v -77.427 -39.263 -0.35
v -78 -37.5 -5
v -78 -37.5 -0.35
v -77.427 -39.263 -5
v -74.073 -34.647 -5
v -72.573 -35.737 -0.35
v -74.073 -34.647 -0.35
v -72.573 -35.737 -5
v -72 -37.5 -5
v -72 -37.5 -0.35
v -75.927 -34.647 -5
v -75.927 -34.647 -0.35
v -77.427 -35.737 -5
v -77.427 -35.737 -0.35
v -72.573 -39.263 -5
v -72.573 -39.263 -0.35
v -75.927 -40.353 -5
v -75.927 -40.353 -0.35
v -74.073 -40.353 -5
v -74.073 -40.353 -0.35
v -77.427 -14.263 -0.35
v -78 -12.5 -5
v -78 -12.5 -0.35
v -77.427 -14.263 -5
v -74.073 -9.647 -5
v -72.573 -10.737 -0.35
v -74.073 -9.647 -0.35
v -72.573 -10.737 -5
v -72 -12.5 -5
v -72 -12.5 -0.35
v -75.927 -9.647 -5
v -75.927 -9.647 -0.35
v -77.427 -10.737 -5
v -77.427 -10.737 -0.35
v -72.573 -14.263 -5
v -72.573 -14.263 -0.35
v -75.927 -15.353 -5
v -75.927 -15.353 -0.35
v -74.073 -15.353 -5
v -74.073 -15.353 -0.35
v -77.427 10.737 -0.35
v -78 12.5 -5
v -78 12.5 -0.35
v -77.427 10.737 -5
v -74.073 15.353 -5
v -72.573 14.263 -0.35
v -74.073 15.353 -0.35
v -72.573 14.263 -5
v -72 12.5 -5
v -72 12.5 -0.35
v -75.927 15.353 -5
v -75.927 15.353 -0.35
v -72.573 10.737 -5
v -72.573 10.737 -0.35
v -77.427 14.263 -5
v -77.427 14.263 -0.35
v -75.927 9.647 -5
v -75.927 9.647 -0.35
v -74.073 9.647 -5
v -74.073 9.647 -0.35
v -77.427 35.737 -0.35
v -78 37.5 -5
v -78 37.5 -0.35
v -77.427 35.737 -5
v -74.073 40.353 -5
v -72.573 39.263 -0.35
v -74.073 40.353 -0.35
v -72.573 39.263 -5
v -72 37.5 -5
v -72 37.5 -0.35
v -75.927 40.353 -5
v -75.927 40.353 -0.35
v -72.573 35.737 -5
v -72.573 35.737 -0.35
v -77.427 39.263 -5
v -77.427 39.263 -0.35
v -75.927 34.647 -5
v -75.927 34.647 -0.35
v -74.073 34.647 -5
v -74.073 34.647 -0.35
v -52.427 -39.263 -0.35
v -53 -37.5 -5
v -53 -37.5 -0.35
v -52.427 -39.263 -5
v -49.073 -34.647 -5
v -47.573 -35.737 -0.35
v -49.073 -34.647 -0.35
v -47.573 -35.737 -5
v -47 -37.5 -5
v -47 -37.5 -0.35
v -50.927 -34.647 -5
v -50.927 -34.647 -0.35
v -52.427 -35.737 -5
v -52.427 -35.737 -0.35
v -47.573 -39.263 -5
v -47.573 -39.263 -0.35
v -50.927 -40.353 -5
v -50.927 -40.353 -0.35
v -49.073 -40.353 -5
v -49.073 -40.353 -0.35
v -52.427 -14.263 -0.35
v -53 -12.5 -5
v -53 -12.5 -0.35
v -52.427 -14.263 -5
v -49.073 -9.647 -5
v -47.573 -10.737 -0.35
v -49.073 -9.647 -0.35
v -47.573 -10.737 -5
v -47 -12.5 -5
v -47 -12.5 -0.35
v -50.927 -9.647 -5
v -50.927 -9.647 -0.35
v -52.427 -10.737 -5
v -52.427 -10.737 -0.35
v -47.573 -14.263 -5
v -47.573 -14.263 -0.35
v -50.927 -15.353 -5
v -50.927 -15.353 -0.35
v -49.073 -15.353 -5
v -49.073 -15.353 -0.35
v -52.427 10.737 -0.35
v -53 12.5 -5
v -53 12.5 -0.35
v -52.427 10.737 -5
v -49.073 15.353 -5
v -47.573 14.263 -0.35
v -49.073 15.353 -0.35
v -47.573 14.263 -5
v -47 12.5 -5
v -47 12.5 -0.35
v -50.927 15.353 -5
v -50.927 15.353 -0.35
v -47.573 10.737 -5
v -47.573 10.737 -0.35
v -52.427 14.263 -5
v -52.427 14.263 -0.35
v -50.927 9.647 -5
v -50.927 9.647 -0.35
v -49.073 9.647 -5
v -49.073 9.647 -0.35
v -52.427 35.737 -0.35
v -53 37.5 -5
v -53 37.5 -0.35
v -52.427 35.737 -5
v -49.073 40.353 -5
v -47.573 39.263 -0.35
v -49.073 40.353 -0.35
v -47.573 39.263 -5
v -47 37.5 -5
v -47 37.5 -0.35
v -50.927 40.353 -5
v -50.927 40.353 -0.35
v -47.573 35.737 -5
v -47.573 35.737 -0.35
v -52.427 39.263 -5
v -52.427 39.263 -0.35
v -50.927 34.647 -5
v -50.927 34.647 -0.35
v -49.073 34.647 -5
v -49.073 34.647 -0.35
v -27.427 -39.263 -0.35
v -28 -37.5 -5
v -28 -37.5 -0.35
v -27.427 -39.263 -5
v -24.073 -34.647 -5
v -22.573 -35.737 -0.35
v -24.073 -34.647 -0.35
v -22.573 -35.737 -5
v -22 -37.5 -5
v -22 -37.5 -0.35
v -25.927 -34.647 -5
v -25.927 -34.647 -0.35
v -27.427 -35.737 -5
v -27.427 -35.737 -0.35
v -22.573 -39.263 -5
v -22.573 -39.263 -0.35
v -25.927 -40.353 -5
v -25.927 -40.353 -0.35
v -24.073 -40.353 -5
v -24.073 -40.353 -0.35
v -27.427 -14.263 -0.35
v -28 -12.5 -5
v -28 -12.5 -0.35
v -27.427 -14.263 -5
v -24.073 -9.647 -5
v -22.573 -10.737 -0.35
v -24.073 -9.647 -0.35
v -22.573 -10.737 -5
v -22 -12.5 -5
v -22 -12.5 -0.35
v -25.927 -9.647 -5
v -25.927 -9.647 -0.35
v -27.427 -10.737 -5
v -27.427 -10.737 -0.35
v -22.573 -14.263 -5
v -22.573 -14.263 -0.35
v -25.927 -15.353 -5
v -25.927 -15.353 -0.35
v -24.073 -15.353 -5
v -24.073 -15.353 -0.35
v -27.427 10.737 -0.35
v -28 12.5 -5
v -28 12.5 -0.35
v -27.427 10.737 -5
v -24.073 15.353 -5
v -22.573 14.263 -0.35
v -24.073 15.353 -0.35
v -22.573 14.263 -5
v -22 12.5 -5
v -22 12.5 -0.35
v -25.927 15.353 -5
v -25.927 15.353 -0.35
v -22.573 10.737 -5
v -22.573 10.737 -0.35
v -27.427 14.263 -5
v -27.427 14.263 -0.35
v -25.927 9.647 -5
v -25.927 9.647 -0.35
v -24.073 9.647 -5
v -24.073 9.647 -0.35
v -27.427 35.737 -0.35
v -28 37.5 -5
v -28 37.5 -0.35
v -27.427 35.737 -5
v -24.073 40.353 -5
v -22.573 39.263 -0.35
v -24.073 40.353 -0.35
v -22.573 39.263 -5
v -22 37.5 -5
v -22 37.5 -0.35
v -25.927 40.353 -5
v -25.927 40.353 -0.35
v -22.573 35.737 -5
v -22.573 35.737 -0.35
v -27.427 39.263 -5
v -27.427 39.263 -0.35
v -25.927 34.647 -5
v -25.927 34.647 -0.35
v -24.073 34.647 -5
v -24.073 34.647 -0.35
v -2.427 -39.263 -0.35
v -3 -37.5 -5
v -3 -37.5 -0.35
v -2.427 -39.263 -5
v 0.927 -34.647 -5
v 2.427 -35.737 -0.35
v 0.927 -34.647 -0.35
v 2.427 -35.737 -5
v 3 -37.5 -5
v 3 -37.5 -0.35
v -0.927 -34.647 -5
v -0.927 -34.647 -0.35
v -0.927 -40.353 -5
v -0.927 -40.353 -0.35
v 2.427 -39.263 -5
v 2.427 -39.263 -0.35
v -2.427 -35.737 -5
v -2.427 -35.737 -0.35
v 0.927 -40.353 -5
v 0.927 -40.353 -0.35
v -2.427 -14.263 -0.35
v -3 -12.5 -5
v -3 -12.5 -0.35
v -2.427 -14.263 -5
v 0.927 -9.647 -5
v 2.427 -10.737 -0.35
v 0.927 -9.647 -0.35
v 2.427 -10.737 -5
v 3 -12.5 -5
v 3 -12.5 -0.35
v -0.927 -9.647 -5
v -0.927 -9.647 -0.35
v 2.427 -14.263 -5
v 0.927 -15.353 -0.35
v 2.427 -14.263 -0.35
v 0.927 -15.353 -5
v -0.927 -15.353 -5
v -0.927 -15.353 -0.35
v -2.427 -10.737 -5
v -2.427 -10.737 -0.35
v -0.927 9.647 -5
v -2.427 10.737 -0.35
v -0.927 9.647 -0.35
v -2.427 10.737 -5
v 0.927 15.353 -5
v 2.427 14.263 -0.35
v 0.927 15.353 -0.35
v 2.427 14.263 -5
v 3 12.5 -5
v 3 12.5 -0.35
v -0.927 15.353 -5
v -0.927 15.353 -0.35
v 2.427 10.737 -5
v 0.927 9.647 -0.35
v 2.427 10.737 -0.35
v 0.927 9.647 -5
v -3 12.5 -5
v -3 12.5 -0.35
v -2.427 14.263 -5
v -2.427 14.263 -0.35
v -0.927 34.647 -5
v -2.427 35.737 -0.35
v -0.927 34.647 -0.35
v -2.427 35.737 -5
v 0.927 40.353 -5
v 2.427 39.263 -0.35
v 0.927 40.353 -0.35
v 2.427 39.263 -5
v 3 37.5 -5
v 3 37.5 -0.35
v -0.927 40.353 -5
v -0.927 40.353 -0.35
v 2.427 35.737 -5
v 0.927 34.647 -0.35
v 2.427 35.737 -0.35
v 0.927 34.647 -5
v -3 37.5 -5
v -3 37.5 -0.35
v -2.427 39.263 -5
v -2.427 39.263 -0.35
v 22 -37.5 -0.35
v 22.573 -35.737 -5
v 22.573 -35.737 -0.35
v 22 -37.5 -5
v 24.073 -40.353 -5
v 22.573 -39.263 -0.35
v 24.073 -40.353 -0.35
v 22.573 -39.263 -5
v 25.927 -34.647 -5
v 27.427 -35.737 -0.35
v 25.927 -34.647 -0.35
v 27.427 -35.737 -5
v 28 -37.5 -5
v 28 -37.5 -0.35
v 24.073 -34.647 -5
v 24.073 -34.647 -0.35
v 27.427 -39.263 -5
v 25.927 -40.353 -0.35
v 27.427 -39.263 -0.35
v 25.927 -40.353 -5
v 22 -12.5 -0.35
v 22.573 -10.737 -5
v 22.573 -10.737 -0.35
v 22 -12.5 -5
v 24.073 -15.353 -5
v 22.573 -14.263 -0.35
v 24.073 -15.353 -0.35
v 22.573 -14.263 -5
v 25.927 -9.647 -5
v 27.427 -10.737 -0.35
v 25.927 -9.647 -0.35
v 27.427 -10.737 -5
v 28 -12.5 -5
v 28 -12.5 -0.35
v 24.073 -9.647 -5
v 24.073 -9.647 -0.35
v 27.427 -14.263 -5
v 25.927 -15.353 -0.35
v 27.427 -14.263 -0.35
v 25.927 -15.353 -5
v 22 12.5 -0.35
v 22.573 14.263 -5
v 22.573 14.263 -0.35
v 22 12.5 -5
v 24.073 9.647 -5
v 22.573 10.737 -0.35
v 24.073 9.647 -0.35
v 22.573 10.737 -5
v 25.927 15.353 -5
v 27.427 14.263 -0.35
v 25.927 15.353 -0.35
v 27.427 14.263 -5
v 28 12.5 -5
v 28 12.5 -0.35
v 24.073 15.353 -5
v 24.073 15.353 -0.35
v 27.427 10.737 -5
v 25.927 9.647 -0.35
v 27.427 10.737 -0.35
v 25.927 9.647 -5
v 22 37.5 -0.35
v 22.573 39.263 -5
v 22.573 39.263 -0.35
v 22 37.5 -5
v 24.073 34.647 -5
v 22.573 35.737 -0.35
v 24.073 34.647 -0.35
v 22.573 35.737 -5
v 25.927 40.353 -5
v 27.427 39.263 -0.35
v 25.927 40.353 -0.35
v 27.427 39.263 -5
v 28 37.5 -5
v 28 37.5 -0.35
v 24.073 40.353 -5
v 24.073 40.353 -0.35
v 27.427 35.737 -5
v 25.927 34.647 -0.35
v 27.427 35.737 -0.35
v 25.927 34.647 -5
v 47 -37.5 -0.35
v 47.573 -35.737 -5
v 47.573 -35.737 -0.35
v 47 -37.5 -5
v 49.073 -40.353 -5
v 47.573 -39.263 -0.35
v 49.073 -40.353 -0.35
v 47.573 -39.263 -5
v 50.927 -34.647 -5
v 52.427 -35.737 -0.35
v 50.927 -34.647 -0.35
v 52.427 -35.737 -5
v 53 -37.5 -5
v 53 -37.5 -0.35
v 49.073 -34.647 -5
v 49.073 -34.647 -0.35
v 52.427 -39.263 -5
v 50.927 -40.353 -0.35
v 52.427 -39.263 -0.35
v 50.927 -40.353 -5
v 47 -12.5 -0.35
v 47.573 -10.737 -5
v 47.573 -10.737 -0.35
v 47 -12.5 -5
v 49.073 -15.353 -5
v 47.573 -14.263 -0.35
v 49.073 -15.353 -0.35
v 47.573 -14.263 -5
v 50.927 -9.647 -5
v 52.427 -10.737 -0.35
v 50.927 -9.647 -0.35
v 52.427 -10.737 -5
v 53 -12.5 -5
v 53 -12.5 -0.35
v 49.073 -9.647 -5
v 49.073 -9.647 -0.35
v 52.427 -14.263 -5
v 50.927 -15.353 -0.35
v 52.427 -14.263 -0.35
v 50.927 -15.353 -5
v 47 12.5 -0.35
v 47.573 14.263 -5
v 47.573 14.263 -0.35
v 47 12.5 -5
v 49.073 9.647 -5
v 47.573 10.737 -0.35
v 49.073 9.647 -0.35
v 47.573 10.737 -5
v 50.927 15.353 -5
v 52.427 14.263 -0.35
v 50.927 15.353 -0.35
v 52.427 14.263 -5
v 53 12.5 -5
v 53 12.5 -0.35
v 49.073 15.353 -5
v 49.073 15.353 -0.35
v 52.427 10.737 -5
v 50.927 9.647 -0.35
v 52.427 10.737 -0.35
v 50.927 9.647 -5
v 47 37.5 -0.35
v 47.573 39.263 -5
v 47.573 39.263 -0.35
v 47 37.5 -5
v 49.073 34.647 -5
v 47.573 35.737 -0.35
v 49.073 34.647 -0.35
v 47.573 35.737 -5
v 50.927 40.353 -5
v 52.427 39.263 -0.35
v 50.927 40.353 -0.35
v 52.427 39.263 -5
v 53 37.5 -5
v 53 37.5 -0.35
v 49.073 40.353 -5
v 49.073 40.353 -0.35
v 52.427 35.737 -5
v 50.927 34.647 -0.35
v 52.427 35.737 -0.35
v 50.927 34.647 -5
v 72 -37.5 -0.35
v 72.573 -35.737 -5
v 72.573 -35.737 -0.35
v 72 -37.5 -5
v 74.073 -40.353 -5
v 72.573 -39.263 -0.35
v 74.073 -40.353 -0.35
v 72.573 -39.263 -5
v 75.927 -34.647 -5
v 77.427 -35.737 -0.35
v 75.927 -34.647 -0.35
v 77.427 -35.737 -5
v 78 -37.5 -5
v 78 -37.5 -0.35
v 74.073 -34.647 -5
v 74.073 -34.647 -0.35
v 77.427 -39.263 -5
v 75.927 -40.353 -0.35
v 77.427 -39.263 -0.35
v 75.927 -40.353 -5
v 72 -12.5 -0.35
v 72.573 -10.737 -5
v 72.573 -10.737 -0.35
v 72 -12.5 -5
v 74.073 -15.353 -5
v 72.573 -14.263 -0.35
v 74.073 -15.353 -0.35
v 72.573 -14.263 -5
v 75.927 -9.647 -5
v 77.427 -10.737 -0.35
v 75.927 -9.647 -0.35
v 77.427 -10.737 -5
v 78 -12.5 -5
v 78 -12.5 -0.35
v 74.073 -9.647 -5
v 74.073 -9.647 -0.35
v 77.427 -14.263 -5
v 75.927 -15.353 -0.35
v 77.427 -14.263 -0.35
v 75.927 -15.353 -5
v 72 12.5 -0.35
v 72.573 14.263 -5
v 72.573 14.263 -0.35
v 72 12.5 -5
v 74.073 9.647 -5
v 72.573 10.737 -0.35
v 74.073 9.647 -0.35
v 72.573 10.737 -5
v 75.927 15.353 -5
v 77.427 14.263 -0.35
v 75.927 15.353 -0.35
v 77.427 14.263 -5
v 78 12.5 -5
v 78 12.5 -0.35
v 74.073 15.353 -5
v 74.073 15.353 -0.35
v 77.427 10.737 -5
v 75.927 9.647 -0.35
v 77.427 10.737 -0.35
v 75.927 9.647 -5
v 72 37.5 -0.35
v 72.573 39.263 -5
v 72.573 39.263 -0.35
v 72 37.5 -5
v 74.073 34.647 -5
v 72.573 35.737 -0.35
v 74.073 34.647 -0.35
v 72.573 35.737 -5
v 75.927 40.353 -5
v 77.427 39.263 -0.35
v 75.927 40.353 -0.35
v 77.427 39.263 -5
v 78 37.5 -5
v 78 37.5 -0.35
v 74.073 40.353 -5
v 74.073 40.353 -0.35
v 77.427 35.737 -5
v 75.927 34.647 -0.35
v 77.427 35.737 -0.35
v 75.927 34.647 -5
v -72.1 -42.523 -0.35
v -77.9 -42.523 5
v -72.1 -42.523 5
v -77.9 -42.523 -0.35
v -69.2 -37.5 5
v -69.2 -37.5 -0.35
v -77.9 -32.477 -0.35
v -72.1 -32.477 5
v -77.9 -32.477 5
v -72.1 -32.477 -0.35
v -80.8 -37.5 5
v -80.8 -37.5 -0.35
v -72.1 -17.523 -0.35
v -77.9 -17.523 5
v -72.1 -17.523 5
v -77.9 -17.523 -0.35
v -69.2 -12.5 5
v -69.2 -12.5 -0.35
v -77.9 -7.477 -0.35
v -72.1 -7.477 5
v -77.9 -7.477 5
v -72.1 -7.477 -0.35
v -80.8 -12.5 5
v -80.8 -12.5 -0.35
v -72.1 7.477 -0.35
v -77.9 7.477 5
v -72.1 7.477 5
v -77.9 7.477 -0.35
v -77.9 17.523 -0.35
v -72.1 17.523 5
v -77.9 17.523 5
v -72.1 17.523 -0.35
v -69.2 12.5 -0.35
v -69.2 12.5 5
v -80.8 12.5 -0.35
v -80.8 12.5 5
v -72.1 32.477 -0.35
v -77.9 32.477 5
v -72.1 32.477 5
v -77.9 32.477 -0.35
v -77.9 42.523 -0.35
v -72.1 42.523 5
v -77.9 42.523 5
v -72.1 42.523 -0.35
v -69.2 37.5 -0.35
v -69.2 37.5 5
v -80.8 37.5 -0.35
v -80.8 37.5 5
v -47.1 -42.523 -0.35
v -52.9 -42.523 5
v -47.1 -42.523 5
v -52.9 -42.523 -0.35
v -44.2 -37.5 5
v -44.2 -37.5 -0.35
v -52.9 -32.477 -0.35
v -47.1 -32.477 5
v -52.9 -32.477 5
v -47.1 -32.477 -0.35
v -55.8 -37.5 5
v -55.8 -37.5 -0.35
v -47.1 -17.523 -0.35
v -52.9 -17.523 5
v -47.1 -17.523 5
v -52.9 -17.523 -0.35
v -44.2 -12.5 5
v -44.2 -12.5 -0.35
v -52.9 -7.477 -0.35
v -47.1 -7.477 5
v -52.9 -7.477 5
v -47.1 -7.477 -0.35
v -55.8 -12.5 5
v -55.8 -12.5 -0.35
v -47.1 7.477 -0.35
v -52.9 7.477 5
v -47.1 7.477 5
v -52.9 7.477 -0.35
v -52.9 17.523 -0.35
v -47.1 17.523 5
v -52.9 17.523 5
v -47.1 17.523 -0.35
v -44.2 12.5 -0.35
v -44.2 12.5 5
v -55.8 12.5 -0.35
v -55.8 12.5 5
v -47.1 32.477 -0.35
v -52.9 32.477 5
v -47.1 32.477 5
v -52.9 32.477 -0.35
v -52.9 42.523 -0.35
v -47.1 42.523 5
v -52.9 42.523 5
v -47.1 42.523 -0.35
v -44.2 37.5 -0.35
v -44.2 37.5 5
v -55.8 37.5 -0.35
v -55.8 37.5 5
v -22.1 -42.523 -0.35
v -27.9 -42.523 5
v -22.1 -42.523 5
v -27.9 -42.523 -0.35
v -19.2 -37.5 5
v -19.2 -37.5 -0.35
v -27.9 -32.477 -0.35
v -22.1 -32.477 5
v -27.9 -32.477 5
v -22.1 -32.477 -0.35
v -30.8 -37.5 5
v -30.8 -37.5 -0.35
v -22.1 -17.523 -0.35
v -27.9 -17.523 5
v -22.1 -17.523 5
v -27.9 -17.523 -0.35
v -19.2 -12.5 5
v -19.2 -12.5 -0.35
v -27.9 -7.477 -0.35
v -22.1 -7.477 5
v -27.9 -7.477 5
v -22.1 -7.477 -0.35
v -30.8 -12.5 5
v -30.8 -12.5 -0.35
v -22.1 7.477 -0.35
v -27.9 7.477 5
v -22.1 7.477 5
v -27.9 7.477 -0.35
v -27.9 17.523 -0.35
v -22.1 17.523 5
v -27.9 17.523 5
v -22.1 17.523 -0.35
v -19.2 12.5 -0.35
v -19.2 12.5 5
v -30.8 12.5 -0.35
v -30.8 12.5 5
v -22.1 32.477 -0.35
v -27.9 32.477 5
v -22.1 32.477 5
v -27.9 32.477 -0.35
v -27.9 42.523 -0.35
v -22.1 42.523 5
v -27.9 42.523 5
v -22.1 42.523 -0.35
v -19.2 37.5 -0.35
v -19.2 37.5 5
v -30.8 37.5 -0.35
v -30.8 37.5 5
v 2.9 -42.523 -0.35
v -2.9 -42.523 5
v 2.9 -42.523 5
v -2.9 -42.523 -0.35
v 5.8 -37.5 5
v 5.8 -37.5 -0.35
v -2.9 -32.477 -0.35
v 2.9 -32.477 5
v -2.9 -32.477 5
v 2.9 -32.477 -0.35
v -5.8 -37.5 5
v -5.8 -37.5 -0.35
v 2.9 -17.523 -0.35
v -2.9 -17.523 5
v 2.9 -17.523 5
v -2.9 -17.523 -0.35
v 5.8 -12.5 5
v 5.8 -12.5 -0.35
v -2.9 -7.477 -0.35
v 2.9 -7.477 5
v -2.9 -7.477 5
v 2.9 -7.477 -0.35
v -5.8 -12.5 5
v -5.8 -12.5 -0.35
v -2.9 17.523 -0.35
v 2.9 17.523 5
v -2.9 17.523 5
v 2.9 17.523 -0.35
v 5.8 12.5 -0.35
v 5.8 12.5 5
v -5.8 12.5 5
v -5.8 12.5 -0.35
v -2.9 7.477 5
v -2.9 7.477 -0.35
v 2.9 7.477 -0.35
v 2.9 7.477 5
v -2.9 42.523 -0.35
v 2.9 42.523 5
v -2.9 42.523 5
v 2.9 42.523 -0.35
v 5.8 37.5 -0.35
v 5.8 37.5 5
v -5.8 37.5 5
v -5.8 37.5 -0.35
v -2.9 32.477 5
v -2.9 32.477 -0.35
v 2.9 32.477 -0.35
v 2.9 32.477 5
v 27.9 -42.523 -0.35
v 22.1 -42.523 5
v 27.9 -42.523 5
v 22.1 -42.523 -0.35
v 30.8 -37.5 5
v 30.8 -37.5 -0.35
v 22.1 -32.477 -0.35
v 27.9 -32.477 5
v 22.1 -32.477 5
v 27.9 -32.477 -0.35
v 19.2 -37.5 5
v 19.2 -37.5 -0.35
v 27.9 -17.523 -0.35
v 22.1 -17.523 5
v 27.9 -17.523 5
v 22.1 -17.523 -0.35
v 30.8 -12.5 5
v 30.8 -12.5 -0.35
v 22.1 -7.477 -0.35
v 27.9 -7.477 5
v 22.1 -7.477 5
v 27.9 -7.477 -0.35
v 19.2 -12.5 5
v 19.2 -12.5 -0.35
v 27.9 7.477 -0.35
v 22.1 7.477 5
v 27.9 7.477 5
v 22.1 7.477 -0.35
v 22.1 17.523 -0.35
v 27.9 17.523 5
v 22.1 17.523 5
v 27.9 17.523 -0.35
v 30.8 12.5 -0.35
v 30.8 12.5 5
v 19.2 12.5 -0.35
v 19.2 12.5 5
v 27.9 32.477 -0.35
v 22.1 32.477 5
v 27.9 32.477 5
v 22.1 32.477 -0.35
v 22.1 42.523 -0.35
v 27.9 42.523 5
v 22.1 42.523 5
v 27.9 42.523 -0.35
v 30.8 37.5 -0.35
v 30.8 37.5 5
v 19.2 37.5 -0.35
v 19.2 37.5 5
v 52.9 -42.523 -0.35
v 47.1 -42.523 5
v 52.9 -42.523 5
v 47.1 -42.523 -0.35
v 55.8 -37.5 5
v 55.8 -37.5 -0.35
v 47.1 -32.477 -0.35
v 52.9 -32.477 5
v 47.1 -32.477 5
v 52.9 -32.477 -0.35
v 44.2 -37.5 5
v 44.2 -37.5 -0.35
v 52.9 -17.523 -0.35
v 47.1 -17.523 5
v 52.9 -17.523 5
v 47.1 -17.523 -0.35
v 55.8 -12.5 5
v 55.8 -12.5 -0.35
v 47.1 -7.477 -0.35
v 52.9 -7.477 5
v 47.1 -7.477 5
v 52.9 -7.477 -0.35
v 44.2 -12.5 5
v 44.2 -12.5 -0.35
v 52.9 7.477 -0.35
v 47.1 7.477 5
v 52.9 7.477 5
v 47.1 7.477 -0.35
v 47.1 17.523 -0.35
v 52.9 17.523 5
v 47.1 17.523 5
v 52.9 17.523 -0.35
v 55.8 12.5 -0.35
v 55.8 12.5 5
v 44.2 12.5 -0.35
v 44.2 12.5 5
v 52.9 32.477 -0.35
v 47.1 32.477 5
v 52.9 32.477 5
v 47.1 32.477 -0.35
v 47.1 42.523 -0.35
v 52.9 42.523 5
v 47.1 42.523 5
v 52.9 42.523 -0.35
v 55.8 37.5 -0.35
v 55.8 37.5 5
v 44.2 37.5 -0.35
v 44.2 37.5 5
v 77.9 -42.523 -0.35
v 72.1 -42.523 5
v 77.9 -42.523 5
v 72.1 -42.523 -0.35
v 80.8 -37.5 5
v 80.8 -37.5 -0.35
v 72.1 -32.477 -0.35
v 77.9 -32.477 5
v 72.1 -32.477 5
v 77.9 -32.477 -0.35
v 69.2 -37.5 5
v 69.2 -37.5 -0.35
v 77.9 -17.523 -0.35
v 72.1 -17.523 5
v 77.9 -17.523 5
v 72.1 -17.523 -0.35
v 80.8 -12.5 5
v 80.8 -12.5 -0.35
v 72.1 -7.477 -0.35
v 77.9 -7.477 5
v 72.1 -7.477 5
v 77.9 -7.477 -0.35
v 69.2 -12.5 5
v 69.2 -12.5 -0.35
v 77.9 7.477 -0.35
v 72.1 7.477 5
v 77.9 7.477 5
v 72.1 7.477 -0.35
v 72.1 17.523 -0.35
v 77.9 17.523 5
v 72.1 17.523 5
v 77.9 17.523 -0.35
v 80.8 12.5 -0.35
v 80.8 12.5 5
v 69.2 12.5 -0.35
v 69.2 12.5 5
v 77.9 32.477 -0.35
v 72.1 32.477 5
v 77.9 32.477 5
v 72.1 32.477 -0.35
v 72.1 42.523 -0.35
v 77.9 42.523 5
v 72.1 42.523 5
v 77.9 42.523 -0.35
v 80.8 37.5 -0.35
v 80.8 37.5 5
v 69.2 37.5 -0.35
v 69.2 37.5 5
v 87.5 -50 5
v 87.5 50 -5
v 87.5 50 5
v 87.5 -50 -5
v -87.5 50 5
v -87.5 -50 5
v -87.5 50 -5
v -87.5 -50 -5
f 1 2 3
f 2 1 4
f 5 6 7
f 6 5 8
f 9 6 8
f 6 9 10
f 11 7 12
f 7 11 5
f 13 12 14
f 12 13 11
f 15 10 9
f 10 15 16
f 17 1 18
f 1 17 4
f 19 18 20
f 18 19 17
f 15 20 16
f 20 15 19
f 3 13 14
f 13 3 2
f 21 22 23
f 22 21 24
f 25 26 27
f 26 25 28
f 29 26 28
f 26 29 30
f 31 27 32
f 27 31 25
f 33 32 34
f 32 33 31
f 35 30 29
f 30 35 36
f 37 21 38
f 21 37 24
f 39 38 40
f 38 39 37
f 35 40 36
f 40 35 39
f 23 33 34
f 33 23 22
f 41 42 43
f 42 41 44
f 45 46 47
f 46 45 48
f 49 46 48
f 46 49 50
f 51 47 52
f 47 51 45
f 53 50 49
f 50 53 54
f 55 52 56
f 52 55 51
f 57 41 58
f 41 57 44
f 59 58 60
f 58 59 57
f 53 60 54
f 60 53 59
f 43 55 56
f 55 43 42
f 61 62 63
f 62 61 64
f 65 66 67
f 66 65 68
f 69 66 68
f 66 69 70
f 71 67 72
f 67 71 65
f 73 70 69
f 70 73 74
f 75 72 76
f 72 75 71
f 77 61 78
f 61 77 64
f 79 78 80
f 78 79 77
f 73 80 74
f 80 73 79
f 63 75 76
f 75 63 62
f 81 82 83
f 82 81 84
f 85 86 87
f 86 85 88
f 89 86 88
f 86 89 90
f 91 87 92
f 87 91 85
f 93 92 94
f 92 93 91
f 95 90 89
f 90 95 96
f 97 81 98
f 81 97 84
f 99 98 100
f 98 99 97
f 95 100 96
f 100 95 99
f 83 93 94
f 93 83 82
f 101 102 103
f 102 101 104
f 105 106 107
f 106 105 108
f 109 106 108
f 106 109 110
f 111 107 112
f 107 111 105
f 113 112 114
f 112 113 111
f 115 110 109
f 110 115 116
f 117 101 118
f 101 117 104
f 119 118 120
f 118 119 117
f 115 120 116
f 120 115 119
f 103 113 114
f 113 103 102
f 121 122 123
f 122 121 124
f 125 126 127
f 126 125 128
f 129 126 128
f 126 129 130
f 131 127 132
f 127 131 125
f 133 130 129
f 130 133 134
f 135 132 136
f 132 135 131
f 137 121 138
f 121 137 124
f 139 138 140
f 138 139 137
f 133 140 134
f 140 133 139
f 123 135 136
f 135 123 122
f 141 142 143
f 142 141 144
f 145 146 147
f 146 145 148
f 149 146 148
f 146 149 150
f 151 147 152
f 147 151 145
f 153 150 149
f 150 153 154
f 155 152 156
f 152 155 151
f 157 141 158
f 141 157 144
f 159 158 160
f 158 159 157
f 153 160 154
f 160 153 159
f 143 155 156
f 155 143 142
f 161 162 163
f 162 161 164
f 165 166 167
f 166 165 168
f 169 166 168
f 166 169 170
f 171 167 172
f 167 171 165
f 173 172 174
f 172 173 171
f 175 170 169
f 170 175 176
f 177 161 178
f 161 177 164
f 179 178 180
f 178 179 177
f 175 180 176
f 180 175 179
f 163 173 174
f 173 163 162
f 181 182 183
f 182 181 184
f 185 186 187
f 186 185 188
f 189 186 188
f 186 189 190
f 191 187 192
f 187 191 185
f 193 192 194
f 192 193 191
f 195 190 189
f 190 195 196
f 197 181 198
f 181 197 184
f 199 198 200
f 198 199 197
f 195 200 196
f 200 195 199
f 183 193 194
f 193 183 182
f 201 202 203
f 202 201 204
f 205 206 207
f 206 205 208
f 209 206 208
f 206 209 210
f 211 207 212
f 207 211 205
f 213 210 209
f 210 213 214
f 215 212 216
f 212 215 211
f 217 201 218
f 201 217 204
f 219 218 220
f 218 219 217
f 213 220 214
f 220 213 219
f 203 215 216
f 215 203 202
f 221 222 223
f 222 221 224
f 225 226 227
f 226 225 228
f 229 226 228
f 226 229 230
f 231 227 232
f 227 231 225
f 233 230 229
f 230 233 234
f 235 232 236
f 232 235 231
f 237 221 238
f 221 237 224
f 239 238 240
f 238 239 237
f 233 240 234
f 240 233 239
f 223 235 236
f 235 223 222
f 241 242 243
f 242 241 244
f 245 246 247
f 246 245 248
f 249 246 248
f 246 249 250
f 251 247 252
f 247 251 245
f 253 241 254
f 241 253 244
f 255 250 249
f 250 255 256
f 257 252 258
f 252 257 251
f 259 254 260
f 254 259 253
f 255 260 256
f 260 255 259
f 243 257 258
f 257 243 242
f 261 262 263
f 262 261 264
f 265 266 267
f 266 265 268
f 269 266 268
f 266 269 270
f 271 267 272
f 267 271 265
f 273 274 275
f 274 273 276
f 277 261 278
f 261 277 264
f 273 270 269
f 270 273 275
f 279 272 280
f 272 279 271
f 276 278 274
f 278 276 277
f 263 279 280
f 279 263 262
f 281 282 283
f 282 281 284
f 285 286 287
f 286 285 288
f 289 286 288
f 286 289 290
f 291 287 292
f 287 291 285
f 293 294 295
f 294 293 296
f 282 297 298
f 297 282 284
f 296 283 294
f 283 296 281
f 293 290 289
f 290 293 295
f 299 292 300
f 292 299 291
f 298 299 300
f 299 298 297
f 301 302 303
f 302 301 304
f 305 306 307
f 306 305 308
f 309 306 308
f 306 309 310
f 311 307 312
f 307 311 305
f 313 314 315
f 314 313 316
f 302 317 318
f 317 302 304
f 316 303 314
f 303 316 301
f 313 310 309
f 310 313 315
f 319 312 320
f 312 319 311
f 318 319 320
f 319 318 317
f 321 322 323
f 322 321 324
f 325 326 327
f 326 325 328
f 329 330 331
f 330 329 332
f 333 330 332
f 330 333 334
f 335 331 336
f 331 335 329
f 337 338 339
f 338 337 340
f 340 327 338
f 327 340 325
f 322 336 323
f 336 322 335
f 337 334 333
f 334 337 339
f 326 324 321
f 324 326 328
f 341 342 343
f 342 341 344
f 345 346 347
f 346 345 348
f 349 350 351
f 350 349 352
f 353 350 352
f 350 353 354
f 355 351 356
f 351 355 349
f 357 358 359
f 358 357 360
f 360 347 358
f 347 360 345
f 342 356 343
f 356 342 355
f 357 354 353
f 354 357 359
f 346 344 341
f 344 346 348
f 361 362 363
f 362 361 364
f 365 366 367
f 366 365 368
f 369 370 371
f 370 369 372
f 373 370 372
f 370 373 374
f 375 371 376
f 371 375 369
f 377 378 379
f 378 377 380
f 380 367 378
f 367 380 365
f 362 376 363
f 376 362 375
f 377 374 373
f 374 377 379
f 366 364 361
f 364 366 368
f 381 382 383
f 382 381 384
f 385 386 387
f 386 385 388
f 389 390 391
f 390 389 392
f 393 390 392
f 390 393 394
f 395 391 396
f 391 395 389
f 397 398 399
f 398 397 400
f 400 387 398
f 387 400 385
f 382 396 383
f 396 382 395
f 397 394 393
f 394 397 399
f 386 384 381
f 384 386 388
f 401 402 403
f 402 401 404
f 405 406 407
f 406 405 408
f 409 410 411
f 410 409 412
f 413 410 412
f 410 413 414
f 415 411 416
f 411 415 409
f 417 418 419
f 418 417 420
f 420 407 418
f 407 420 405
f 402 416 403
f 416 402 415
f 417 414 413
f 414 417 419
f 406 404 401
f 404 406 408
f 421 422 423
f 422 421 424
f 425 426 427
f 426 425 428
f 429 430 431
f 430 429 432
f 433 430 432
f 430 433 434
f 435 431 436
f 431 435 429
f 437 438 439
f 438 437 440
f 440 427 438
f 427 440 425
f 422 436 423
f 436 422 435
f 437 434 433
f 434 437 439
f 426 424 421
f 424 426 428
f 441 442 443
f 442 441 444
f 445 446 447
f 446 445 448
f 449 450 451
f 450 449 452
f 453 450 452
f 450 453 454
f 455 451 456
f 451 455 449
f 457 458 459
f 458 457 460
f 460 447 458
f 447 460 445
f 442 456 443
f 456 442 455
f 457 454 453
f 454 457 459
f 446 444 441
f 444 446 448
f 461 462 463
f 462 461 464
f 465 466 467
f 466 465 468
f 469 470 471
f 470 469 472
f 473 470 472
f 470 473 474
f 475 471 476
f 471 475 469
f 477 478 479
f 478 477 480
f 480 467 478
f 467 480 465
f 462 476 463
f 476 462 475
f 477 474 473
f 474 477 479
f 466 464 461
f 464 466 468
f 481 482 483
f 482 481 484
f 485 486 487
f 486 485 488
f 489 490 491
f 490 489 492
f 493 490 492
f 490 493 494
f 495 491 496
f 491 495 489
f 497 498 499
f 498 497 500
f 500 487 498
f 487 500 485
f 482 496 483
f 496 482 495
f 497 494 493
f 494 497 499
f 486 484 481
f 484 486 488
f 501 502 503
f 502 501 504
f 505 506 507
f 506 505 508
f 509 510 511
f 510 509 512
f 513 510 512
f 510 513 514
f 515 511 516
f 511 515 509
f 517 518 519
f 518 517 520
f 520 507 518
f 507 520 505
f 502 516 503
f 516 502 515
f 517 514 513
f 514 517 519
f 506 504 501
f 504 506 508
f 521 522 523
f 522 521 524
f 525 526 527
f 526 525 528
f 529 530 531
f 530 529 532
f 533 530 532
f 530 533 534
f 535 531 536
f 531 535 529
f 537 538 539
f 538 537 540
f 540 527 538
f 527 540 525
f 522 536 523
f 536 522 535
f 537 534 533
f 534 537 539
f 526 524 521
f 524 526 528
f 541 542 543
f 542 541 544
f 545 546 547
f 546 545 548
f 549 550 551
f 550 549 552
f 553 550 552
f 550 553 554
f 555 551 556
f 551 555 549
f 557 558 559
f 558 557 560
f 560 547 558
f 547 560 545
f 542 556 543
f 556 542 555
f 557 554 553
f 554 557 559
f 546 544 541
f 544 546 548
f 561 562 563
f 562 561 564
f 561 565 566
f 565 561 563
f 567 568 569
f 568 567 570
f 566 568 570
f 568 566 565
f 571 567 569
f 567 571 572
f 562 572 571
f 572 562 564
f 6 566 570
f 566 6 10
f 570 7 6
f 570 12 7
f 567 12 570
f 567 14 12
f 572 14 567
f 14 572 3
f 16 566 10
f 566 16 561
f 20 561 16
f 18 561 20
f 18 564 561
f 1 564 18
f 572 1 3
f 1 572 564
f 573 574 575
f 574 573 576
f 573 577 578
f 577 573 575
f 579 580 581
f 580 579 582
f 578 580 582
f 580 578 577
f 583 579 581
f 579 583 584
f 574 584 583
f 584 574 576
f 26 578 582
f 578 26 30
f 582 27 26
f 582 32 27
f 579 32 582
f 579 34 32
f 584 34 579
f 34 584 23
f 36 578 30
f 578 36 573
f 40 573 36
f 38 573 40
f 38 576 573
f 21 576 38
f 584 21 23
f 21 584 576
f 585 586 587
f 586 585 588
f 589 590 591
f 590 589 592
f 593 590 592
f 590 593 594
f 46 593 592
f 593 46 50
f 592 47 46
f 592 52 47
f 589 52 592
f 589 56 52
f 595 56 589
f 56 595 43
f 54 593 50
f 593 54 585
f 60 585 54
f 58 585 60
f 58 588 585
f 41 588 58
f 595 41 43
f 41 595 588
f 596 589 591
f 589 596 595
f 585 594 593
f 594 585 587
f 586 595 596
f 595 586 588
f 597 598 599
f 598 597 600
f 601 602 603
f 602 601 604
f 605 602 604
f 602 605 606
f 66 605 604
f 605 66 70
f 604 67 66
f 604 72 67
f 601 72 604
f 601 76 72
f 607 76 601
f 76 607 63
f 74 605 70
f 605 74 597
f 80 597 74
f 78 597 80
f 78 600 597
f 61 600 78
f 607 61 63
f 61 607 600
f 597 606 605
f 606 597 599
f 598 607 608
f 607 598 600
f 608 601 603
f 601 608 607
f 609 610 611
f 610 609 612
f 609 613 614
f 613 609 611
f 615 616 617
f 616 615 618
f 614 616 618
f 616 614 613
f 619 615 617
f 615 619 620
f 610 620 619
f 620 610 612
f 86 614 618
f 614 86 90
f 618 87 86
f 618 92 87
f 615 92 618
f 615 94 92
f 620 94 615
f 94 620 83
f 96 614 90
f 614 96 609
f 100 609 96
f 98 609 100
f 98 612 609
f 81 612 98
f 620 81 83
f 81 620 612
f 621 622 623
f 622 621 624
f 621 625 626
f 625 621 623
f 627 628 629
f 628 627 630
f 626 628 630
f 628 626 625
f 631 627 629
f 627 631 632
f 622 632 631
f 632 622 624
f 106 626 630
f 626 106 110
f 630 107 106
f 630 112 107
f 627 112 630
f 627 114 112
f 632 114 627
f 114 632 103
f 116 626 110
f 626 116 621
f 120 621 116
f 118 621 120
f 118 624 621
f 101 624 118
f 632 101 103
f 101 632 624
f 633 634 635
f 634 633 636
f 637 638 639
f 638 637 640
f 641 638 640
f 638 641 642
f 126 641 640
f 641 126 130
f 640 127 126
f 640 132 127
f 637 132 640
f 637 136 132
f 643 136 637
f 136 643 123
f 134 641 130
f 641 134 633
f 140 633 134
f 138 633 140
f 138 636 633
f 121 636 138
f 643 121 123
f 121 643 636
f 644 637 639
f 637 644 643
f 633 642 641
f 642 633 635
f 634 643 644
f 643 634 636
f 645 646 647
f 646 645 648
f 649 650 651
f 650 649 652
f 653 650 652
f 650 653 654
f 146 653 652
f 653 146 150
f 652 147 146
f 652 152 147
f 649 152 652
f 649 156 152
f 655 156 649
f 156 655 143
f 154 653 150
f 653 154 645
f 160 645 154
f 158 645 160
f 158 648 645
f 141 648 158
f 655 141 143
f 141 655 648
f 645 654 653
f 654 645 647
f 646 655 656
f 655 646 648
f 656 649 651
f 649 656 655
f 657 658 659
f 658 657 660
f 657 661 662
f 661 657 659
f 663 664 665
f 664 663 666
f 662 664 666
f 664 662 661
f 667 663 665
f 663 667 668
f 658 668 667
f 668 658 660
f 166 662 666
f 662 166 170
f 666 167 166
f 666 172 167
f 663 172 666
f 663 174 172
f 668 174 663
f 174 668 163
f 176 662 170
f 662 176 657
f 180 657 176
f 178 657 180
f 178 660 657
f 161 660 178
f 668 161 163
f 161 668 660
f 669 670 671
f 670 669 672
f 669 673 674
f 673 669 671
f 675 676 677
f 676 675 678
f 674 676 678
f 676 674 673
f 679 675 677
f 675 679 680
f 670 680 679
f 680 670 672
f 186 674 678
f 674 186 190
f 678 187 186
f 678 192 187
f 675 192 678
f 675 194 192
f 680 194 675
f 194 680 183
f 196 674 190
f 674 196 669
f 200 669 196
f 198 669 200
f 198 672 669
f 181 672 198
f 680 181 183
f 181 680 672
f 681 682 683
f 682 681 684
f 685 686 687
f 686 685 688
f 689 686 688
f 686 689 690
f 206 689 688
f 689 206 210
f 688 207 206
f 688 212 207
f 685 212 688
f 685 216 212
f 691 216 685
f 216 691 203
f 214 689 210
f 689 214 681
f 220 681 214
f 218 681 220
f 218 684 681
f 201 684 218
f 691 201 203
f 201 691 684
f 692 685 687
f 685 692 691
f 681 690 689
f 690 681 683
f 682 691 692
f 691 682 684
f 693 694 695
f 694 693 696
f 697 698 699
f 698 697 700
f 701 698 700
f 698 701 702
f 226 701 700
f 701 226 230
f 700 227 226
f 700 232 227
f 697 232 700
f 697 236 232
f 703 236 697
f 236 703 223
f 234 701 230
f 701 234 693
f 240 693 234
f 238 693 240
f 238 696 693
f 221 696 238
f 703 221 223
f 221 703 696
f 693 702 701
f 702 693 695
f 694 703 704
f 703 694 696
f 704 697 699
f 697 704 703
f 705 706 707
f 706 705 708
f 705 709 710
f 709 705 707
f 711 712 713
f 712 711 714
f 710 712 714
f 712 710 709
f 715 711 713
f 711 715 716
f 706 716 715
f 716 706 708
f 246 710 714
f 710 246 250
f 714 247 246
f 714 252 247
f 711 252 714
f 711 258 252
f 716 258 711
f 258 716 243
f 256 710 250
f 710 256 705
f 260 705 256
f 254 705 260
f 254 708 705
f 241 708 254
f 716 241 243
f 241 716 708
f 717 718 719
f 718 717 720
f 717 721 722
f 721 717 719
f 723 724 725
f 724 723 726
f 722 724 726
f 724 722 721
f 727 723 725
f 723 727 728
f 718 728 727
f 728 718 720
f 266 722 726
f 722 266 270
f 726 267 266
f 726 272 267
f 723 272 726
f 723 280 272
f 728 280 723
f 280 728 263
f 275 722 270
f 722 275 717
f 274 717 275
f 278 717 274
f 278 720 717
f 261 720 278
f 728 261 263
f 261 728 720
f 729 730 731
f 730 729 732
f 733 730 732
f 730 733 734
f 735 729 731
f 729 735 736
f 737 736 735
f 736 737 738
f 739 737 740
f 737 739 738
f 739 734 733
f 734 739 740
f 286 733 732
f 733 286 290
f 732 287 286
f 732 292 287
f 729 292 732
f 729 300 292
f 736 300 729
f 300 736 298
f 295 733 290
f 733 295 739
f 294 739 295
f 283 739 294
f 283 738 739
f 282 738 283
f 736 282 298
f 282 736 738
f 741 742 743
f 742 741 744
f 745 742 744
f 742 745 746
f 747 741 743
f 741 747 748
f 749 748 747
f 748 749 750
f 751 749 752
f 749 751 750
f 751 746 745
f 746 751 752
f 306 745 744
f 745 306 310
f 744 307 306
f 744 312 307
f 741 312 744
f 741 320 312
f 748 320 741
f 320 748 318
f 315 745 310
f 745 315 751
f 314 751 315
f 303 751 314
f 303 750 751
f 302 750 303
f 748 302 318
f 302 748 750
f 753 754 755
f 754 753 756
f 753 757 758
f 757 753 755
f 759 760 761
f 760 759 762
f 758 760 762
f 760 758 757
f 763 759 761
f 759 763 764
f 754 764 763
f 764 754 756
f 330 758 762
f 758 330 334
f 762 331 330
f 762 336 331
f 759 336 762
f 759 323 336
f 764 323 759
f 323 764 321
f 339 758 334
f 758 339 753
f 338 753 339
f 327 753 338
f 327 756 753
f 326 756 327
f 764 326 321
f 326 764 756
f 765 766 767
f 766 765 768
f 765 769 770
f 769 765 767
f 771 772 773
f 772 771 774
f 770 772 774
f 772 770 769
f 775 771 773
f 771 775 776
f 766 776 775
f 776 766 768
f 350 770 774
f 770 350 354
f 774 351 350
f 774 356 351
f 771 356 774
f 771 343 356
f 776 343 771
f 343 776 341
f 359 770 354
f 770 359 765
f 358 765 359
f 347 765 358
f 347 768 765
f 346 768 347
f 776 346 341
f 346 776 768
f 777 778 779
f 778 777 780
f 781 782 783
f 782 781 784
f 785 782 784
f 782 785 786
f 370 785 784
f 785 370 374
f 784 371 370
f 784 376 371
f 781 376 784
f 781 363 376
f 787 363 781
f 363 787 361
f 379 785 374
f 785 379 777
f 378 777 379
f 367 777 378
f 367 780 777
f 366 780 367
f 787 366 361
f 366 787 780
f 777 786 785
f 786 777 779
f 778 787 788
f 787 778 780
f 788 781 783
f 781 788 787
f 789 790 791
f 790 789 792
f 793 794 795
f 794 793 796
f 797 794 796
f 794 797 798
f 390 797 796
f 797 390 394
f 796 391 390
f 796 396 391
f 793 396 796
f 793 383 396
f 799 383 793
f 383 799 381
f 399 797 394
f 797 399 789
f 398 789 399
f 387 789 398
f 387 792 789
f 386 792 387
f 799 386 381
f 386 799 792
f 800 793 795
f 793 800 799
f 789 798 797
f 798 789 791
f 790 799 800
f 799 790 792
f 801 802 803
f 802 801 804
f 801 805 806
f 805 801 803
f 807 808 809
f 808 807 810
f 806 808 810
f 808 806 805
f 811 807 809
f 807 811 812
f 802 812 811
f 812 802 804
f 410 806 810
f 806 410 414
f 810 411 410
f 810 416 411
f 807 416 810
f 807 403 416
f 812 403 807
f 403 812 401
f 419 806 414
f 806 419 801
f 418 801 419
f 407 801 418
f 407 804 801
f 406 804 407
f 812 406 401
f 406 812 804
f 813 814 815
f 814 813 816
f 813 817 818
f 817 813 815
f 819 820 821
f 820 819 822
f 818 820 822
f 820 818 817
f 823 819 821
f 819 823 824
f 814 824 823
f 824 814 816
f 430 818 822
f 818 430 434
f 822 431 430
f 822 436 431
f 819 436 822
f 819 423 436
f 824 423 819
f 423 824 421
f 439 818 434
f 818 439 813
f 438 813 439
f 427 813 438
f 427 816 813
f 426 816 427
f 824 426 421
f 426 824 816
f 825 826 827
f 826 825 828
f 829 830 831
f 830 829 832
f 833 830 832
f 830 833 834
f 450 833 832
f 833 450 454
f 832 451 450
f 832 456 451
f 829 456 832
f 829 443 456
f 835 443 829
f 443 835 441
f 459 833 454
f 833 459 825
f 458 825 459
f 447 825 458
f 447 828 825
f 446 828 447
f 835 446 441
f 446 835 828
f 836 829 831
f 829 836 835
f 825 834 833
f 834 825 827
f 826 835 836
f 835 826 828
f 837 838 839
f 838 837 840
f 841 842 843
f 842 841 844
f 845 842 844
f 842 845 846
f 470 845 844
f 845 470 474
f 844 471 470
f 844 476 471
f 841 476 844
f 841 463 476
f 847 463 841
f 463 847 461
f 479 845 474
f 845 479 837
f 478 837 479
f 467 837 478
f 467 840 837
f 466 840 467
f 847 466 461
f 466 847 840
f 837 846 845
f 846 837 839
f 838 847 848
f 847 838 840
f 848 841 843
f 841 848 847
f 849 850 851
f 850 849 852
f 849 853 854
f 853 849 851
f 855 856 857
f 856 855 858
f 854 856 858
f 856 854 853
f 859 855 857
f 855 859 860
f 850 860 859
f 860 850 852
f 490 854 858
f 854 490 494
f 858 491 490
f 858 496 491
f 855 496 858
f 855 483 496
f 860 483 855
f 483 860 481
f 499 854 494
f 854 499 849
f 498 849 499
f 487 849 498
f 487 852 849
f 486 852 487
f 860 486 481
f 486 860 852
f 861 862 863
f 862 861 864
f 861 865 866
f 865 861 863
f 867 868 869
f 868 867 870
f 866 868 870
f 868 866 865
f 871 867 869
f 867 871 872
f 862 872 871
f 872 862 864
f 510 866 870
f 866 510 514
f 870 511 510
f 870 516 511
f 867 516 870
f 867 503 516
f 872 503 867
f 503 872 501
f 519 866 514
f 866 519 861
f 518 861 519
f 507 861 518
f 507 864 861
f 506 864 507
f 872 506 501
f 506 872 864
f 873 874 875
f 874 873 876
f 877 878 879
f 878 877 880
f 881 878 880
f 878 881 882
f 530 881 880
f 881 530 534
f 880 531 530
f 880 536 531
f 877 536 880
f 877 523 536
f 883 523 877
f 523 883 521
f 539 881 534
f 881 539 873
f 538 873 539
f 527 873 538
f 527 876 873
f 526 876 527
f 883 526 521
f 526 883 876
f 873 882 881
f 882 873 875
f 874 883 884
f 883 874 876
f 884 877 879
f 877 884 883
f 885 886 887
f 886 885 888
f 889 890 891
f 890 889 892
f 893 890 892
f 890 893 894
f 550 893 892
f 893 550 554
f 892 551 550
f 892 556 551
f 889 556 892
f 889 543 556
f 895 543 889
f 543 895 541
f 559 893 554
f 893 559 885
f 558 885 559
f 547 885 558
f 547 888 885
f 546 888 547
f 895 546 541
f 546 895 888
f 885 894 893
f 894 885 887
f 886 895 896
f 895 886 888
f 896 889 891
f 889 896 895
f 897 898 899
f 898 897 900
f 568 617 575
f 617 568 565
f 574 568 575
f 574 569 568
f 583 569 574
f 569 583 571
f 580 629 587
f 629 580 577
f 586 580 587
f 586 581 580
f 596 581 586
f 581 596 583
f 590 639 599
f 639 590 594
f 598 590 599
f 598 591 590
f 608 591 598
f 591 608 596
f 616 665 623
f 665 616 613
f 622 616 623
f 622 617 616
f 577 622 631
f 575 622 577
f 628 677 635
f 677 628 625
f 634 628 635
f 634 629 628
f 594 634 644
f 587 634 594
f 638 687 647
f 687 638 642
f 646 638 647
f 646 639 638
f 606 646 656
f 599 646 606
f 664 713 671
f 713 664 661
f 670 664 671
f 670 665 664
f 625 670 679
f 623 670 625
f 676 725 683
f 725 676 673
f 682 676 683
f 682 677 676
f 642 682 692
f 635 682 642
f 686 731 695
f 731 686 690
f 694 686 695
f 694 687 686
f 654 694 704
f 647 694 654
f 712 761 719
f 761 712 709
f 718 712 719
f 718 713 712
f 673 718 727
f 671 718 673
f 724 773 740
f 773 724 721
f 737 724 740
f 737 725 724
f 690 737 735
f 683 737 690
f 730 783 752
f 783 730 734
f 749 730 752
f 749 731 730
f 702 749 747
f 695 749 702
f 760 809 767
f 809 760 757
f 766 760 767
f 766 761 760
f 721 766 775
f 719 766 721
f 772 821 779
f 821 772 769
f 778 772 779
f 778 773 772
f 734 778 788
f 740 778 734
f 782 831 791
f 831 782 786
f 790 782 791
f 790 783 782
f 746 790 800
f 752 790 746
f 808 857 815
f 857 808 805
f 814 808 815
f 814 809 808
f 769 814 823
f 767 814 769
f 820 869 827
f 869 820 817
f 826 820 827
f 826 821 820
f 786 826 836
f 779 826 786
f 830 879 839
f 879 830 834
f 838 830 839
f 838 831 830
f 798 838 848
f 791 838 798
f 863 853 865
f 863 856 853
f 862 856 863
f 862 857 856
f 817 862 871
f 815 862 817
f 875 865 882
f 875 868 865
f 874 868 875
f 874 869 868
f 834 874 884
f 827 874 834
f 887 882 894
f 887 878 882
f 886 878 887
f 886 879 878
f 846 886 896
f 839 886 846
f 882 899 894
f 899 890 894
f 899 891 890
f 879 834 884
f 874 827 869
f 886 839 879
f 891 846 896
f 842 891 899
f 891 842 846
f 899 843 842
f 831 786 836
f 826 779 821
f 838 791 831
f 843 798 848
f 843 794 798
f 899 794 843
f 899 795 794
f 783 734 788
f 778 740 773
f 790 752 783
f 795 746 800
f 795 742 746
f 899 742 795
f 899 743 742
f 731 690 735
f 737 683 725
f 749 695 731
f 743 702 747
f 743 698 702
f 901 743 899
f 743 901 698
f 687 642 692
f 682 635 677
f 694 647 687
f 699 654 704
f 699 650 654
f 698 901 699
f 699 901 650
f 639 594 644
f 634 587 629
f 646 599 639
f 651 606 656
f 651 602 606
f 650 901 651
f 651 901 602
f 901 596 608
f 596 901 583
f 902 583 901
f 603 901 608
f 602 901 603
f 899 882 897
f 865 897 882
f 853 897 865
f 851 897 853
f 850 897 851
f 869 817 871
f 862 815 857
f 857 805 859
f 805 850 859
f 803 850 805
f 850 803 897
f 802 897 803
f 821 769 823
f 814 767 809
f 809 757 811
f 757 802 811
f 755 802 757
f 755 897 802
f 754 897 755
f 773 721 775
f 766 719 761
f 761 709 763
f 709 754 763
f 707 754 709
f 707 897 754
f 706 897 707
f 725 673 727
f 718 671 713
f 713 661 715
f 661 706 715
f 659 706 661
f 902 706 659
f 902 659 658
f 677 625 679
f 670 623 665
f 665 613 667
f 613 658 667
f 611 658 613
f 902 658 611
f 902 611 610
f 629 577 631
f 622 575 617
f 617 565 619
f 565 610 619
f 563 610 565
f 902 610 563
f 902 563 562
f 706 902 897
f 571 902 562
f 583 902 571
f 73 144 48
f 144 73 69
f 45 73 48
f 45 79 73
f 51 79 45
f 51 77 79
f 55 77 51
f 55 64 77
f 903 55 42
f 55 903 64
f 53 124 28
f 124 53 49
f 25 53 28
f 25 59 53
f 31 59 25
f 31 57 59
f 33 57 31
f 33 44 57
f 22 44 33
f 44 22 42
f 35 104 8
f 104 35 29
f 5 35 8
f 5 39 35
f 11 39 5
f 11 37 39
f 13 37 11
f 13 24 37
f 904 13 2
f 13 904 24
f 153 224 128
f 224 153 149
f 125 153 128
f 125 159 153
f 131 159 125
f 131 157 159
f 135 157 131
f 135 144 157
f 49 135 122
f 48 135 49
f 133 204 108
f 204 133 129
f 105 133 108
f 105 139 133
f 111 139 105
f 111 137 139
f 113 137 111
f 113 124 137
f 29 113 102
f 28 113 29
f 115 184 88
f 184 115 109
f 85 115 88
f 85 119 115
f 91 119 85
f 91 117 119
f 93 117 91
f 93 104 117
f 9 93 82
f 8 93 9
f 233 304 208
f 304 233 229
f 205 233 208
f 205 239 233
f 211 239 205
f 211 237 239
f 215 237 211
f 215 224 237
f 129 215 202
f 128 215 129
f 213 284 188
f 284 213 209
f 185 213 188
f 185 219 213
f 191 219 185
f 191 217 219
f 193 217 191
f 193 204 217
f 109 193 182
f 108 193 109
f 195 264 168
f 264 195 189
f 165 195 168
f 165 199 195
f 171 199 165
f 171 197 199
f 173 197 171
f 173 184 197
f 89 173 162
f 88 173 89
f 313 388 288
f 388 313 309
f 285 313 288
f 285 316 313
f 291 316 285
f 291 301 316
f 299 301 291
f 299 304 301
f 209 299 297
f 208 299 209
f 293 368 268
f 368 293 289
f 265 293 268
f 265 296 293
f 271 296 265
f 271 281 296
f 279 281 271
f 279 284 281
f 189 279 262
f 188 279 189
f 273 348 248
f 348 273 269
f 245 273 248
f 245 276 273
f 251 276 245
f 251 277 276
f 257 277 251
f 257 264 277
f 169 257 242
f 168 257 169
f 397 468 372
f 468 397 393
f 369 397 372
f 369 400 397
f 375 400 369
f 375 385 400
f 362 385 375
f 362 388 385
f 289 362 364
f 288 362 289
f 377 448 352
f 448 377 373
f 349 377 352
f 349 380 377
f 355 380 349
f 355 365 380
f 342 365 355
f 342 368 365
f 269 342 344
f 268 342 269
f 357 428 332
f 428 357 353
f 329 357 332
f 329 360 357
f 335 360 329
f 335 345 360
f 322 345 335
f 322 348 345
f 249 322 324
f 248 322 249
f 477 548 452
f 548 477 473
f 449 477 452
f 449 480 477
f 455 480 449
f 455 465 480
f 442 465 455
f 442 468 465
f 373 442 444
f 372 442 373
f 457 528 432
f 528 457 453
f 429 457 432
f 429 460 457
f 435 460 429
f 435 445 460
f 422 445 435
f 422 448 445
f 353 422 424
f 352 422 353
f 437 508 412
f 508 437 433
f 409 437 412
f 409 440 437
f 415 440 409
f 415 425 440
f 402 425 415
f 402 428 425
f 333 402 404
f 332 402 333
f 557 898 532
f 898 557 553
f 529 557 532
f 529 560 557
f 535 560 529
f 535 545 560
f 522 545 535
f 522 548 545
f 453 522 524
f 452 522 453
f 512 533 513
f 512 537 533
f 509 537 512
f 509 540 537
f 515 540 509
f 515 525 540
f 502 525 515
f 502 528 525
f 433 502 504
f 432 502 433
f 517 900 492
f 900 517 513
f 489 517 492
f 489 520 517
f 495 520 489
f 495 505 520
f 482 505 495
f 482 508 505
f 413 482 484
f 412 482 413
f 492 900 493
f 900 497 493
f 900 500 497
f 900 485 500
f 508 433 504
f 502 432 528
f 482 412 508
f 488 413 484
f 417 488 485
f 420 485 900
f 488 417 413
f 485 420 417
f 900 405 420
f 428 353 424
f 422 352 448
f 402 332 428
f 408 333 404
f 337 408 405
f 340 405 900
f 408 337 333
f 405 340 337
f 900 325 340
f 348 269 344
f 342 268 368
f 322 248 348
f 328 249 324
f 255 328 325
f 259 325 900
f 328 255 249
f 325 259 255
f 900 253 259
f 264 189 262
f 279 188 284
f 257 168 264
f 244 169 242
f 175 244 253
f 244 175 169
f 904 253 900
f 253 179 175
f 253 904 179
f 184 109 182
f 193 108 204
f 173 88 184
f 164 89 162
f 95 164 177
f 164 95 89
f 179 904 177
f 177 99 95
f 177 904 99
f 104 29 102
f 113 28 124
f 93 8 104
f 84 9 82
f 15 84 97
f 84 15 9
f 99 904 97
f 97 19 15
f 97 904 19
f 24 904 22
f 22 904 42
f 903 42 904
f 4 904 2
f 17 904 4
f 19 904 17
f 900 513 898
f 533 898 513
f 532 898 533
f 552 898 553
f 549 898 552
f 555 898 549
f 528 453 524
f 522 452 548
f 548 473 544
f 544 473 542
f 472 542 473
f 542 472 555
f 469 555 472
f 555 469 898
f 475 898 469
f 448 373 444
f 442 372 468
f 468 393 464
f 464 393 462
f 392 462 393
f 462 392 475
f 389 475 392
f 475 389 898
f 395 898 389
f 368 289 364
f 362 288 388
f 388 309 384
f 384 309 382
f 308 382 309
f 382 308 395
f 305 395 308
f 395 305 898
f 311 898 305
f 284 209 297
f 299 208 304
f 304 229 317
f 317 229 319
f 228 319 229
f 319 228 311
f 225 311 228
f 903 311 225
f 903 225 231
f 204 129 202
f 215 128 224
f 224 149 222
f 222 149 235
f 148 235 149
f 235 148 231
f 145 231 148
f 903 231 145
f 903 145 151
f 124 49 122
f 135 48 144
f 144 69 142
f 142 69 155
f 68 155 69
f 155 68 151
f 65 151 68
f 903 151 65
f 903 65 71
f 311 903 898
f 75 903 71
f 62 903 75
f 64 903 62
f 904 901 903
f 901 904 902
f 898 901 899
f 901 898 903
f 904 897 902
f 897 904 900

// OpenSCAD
// optical breadboard  - on 25 mm metric pitch, with M6 nuttraps 
// GNU GPLv2
//amk


board();

x=175;
y=100;
z = 10;
pitch = 25;
xmax=(x-pitch/2)/pitch;
ymax=(y-pitch/2)/pitch;

module board(){
difference(){
translate([0, 0,0]) cube([x,y,z], center=true);

union(){
for (i=[0:xmax])
for (j=[0:ymax])
translate([-x/2+pitch/2+pitch*i, -y/2+pitch/2+pitch*j,0])cylinder(11,3,3, center=true);
for (i=[0:xmax])
for (j=[0:ymax])
translate([-x/2+pitch/2+pitch*i,-y/2+pitch/2+pitch*j,2.4])cylinder(r=5.8, h=5.5, center=true, $fn=6); 
}
}
}
